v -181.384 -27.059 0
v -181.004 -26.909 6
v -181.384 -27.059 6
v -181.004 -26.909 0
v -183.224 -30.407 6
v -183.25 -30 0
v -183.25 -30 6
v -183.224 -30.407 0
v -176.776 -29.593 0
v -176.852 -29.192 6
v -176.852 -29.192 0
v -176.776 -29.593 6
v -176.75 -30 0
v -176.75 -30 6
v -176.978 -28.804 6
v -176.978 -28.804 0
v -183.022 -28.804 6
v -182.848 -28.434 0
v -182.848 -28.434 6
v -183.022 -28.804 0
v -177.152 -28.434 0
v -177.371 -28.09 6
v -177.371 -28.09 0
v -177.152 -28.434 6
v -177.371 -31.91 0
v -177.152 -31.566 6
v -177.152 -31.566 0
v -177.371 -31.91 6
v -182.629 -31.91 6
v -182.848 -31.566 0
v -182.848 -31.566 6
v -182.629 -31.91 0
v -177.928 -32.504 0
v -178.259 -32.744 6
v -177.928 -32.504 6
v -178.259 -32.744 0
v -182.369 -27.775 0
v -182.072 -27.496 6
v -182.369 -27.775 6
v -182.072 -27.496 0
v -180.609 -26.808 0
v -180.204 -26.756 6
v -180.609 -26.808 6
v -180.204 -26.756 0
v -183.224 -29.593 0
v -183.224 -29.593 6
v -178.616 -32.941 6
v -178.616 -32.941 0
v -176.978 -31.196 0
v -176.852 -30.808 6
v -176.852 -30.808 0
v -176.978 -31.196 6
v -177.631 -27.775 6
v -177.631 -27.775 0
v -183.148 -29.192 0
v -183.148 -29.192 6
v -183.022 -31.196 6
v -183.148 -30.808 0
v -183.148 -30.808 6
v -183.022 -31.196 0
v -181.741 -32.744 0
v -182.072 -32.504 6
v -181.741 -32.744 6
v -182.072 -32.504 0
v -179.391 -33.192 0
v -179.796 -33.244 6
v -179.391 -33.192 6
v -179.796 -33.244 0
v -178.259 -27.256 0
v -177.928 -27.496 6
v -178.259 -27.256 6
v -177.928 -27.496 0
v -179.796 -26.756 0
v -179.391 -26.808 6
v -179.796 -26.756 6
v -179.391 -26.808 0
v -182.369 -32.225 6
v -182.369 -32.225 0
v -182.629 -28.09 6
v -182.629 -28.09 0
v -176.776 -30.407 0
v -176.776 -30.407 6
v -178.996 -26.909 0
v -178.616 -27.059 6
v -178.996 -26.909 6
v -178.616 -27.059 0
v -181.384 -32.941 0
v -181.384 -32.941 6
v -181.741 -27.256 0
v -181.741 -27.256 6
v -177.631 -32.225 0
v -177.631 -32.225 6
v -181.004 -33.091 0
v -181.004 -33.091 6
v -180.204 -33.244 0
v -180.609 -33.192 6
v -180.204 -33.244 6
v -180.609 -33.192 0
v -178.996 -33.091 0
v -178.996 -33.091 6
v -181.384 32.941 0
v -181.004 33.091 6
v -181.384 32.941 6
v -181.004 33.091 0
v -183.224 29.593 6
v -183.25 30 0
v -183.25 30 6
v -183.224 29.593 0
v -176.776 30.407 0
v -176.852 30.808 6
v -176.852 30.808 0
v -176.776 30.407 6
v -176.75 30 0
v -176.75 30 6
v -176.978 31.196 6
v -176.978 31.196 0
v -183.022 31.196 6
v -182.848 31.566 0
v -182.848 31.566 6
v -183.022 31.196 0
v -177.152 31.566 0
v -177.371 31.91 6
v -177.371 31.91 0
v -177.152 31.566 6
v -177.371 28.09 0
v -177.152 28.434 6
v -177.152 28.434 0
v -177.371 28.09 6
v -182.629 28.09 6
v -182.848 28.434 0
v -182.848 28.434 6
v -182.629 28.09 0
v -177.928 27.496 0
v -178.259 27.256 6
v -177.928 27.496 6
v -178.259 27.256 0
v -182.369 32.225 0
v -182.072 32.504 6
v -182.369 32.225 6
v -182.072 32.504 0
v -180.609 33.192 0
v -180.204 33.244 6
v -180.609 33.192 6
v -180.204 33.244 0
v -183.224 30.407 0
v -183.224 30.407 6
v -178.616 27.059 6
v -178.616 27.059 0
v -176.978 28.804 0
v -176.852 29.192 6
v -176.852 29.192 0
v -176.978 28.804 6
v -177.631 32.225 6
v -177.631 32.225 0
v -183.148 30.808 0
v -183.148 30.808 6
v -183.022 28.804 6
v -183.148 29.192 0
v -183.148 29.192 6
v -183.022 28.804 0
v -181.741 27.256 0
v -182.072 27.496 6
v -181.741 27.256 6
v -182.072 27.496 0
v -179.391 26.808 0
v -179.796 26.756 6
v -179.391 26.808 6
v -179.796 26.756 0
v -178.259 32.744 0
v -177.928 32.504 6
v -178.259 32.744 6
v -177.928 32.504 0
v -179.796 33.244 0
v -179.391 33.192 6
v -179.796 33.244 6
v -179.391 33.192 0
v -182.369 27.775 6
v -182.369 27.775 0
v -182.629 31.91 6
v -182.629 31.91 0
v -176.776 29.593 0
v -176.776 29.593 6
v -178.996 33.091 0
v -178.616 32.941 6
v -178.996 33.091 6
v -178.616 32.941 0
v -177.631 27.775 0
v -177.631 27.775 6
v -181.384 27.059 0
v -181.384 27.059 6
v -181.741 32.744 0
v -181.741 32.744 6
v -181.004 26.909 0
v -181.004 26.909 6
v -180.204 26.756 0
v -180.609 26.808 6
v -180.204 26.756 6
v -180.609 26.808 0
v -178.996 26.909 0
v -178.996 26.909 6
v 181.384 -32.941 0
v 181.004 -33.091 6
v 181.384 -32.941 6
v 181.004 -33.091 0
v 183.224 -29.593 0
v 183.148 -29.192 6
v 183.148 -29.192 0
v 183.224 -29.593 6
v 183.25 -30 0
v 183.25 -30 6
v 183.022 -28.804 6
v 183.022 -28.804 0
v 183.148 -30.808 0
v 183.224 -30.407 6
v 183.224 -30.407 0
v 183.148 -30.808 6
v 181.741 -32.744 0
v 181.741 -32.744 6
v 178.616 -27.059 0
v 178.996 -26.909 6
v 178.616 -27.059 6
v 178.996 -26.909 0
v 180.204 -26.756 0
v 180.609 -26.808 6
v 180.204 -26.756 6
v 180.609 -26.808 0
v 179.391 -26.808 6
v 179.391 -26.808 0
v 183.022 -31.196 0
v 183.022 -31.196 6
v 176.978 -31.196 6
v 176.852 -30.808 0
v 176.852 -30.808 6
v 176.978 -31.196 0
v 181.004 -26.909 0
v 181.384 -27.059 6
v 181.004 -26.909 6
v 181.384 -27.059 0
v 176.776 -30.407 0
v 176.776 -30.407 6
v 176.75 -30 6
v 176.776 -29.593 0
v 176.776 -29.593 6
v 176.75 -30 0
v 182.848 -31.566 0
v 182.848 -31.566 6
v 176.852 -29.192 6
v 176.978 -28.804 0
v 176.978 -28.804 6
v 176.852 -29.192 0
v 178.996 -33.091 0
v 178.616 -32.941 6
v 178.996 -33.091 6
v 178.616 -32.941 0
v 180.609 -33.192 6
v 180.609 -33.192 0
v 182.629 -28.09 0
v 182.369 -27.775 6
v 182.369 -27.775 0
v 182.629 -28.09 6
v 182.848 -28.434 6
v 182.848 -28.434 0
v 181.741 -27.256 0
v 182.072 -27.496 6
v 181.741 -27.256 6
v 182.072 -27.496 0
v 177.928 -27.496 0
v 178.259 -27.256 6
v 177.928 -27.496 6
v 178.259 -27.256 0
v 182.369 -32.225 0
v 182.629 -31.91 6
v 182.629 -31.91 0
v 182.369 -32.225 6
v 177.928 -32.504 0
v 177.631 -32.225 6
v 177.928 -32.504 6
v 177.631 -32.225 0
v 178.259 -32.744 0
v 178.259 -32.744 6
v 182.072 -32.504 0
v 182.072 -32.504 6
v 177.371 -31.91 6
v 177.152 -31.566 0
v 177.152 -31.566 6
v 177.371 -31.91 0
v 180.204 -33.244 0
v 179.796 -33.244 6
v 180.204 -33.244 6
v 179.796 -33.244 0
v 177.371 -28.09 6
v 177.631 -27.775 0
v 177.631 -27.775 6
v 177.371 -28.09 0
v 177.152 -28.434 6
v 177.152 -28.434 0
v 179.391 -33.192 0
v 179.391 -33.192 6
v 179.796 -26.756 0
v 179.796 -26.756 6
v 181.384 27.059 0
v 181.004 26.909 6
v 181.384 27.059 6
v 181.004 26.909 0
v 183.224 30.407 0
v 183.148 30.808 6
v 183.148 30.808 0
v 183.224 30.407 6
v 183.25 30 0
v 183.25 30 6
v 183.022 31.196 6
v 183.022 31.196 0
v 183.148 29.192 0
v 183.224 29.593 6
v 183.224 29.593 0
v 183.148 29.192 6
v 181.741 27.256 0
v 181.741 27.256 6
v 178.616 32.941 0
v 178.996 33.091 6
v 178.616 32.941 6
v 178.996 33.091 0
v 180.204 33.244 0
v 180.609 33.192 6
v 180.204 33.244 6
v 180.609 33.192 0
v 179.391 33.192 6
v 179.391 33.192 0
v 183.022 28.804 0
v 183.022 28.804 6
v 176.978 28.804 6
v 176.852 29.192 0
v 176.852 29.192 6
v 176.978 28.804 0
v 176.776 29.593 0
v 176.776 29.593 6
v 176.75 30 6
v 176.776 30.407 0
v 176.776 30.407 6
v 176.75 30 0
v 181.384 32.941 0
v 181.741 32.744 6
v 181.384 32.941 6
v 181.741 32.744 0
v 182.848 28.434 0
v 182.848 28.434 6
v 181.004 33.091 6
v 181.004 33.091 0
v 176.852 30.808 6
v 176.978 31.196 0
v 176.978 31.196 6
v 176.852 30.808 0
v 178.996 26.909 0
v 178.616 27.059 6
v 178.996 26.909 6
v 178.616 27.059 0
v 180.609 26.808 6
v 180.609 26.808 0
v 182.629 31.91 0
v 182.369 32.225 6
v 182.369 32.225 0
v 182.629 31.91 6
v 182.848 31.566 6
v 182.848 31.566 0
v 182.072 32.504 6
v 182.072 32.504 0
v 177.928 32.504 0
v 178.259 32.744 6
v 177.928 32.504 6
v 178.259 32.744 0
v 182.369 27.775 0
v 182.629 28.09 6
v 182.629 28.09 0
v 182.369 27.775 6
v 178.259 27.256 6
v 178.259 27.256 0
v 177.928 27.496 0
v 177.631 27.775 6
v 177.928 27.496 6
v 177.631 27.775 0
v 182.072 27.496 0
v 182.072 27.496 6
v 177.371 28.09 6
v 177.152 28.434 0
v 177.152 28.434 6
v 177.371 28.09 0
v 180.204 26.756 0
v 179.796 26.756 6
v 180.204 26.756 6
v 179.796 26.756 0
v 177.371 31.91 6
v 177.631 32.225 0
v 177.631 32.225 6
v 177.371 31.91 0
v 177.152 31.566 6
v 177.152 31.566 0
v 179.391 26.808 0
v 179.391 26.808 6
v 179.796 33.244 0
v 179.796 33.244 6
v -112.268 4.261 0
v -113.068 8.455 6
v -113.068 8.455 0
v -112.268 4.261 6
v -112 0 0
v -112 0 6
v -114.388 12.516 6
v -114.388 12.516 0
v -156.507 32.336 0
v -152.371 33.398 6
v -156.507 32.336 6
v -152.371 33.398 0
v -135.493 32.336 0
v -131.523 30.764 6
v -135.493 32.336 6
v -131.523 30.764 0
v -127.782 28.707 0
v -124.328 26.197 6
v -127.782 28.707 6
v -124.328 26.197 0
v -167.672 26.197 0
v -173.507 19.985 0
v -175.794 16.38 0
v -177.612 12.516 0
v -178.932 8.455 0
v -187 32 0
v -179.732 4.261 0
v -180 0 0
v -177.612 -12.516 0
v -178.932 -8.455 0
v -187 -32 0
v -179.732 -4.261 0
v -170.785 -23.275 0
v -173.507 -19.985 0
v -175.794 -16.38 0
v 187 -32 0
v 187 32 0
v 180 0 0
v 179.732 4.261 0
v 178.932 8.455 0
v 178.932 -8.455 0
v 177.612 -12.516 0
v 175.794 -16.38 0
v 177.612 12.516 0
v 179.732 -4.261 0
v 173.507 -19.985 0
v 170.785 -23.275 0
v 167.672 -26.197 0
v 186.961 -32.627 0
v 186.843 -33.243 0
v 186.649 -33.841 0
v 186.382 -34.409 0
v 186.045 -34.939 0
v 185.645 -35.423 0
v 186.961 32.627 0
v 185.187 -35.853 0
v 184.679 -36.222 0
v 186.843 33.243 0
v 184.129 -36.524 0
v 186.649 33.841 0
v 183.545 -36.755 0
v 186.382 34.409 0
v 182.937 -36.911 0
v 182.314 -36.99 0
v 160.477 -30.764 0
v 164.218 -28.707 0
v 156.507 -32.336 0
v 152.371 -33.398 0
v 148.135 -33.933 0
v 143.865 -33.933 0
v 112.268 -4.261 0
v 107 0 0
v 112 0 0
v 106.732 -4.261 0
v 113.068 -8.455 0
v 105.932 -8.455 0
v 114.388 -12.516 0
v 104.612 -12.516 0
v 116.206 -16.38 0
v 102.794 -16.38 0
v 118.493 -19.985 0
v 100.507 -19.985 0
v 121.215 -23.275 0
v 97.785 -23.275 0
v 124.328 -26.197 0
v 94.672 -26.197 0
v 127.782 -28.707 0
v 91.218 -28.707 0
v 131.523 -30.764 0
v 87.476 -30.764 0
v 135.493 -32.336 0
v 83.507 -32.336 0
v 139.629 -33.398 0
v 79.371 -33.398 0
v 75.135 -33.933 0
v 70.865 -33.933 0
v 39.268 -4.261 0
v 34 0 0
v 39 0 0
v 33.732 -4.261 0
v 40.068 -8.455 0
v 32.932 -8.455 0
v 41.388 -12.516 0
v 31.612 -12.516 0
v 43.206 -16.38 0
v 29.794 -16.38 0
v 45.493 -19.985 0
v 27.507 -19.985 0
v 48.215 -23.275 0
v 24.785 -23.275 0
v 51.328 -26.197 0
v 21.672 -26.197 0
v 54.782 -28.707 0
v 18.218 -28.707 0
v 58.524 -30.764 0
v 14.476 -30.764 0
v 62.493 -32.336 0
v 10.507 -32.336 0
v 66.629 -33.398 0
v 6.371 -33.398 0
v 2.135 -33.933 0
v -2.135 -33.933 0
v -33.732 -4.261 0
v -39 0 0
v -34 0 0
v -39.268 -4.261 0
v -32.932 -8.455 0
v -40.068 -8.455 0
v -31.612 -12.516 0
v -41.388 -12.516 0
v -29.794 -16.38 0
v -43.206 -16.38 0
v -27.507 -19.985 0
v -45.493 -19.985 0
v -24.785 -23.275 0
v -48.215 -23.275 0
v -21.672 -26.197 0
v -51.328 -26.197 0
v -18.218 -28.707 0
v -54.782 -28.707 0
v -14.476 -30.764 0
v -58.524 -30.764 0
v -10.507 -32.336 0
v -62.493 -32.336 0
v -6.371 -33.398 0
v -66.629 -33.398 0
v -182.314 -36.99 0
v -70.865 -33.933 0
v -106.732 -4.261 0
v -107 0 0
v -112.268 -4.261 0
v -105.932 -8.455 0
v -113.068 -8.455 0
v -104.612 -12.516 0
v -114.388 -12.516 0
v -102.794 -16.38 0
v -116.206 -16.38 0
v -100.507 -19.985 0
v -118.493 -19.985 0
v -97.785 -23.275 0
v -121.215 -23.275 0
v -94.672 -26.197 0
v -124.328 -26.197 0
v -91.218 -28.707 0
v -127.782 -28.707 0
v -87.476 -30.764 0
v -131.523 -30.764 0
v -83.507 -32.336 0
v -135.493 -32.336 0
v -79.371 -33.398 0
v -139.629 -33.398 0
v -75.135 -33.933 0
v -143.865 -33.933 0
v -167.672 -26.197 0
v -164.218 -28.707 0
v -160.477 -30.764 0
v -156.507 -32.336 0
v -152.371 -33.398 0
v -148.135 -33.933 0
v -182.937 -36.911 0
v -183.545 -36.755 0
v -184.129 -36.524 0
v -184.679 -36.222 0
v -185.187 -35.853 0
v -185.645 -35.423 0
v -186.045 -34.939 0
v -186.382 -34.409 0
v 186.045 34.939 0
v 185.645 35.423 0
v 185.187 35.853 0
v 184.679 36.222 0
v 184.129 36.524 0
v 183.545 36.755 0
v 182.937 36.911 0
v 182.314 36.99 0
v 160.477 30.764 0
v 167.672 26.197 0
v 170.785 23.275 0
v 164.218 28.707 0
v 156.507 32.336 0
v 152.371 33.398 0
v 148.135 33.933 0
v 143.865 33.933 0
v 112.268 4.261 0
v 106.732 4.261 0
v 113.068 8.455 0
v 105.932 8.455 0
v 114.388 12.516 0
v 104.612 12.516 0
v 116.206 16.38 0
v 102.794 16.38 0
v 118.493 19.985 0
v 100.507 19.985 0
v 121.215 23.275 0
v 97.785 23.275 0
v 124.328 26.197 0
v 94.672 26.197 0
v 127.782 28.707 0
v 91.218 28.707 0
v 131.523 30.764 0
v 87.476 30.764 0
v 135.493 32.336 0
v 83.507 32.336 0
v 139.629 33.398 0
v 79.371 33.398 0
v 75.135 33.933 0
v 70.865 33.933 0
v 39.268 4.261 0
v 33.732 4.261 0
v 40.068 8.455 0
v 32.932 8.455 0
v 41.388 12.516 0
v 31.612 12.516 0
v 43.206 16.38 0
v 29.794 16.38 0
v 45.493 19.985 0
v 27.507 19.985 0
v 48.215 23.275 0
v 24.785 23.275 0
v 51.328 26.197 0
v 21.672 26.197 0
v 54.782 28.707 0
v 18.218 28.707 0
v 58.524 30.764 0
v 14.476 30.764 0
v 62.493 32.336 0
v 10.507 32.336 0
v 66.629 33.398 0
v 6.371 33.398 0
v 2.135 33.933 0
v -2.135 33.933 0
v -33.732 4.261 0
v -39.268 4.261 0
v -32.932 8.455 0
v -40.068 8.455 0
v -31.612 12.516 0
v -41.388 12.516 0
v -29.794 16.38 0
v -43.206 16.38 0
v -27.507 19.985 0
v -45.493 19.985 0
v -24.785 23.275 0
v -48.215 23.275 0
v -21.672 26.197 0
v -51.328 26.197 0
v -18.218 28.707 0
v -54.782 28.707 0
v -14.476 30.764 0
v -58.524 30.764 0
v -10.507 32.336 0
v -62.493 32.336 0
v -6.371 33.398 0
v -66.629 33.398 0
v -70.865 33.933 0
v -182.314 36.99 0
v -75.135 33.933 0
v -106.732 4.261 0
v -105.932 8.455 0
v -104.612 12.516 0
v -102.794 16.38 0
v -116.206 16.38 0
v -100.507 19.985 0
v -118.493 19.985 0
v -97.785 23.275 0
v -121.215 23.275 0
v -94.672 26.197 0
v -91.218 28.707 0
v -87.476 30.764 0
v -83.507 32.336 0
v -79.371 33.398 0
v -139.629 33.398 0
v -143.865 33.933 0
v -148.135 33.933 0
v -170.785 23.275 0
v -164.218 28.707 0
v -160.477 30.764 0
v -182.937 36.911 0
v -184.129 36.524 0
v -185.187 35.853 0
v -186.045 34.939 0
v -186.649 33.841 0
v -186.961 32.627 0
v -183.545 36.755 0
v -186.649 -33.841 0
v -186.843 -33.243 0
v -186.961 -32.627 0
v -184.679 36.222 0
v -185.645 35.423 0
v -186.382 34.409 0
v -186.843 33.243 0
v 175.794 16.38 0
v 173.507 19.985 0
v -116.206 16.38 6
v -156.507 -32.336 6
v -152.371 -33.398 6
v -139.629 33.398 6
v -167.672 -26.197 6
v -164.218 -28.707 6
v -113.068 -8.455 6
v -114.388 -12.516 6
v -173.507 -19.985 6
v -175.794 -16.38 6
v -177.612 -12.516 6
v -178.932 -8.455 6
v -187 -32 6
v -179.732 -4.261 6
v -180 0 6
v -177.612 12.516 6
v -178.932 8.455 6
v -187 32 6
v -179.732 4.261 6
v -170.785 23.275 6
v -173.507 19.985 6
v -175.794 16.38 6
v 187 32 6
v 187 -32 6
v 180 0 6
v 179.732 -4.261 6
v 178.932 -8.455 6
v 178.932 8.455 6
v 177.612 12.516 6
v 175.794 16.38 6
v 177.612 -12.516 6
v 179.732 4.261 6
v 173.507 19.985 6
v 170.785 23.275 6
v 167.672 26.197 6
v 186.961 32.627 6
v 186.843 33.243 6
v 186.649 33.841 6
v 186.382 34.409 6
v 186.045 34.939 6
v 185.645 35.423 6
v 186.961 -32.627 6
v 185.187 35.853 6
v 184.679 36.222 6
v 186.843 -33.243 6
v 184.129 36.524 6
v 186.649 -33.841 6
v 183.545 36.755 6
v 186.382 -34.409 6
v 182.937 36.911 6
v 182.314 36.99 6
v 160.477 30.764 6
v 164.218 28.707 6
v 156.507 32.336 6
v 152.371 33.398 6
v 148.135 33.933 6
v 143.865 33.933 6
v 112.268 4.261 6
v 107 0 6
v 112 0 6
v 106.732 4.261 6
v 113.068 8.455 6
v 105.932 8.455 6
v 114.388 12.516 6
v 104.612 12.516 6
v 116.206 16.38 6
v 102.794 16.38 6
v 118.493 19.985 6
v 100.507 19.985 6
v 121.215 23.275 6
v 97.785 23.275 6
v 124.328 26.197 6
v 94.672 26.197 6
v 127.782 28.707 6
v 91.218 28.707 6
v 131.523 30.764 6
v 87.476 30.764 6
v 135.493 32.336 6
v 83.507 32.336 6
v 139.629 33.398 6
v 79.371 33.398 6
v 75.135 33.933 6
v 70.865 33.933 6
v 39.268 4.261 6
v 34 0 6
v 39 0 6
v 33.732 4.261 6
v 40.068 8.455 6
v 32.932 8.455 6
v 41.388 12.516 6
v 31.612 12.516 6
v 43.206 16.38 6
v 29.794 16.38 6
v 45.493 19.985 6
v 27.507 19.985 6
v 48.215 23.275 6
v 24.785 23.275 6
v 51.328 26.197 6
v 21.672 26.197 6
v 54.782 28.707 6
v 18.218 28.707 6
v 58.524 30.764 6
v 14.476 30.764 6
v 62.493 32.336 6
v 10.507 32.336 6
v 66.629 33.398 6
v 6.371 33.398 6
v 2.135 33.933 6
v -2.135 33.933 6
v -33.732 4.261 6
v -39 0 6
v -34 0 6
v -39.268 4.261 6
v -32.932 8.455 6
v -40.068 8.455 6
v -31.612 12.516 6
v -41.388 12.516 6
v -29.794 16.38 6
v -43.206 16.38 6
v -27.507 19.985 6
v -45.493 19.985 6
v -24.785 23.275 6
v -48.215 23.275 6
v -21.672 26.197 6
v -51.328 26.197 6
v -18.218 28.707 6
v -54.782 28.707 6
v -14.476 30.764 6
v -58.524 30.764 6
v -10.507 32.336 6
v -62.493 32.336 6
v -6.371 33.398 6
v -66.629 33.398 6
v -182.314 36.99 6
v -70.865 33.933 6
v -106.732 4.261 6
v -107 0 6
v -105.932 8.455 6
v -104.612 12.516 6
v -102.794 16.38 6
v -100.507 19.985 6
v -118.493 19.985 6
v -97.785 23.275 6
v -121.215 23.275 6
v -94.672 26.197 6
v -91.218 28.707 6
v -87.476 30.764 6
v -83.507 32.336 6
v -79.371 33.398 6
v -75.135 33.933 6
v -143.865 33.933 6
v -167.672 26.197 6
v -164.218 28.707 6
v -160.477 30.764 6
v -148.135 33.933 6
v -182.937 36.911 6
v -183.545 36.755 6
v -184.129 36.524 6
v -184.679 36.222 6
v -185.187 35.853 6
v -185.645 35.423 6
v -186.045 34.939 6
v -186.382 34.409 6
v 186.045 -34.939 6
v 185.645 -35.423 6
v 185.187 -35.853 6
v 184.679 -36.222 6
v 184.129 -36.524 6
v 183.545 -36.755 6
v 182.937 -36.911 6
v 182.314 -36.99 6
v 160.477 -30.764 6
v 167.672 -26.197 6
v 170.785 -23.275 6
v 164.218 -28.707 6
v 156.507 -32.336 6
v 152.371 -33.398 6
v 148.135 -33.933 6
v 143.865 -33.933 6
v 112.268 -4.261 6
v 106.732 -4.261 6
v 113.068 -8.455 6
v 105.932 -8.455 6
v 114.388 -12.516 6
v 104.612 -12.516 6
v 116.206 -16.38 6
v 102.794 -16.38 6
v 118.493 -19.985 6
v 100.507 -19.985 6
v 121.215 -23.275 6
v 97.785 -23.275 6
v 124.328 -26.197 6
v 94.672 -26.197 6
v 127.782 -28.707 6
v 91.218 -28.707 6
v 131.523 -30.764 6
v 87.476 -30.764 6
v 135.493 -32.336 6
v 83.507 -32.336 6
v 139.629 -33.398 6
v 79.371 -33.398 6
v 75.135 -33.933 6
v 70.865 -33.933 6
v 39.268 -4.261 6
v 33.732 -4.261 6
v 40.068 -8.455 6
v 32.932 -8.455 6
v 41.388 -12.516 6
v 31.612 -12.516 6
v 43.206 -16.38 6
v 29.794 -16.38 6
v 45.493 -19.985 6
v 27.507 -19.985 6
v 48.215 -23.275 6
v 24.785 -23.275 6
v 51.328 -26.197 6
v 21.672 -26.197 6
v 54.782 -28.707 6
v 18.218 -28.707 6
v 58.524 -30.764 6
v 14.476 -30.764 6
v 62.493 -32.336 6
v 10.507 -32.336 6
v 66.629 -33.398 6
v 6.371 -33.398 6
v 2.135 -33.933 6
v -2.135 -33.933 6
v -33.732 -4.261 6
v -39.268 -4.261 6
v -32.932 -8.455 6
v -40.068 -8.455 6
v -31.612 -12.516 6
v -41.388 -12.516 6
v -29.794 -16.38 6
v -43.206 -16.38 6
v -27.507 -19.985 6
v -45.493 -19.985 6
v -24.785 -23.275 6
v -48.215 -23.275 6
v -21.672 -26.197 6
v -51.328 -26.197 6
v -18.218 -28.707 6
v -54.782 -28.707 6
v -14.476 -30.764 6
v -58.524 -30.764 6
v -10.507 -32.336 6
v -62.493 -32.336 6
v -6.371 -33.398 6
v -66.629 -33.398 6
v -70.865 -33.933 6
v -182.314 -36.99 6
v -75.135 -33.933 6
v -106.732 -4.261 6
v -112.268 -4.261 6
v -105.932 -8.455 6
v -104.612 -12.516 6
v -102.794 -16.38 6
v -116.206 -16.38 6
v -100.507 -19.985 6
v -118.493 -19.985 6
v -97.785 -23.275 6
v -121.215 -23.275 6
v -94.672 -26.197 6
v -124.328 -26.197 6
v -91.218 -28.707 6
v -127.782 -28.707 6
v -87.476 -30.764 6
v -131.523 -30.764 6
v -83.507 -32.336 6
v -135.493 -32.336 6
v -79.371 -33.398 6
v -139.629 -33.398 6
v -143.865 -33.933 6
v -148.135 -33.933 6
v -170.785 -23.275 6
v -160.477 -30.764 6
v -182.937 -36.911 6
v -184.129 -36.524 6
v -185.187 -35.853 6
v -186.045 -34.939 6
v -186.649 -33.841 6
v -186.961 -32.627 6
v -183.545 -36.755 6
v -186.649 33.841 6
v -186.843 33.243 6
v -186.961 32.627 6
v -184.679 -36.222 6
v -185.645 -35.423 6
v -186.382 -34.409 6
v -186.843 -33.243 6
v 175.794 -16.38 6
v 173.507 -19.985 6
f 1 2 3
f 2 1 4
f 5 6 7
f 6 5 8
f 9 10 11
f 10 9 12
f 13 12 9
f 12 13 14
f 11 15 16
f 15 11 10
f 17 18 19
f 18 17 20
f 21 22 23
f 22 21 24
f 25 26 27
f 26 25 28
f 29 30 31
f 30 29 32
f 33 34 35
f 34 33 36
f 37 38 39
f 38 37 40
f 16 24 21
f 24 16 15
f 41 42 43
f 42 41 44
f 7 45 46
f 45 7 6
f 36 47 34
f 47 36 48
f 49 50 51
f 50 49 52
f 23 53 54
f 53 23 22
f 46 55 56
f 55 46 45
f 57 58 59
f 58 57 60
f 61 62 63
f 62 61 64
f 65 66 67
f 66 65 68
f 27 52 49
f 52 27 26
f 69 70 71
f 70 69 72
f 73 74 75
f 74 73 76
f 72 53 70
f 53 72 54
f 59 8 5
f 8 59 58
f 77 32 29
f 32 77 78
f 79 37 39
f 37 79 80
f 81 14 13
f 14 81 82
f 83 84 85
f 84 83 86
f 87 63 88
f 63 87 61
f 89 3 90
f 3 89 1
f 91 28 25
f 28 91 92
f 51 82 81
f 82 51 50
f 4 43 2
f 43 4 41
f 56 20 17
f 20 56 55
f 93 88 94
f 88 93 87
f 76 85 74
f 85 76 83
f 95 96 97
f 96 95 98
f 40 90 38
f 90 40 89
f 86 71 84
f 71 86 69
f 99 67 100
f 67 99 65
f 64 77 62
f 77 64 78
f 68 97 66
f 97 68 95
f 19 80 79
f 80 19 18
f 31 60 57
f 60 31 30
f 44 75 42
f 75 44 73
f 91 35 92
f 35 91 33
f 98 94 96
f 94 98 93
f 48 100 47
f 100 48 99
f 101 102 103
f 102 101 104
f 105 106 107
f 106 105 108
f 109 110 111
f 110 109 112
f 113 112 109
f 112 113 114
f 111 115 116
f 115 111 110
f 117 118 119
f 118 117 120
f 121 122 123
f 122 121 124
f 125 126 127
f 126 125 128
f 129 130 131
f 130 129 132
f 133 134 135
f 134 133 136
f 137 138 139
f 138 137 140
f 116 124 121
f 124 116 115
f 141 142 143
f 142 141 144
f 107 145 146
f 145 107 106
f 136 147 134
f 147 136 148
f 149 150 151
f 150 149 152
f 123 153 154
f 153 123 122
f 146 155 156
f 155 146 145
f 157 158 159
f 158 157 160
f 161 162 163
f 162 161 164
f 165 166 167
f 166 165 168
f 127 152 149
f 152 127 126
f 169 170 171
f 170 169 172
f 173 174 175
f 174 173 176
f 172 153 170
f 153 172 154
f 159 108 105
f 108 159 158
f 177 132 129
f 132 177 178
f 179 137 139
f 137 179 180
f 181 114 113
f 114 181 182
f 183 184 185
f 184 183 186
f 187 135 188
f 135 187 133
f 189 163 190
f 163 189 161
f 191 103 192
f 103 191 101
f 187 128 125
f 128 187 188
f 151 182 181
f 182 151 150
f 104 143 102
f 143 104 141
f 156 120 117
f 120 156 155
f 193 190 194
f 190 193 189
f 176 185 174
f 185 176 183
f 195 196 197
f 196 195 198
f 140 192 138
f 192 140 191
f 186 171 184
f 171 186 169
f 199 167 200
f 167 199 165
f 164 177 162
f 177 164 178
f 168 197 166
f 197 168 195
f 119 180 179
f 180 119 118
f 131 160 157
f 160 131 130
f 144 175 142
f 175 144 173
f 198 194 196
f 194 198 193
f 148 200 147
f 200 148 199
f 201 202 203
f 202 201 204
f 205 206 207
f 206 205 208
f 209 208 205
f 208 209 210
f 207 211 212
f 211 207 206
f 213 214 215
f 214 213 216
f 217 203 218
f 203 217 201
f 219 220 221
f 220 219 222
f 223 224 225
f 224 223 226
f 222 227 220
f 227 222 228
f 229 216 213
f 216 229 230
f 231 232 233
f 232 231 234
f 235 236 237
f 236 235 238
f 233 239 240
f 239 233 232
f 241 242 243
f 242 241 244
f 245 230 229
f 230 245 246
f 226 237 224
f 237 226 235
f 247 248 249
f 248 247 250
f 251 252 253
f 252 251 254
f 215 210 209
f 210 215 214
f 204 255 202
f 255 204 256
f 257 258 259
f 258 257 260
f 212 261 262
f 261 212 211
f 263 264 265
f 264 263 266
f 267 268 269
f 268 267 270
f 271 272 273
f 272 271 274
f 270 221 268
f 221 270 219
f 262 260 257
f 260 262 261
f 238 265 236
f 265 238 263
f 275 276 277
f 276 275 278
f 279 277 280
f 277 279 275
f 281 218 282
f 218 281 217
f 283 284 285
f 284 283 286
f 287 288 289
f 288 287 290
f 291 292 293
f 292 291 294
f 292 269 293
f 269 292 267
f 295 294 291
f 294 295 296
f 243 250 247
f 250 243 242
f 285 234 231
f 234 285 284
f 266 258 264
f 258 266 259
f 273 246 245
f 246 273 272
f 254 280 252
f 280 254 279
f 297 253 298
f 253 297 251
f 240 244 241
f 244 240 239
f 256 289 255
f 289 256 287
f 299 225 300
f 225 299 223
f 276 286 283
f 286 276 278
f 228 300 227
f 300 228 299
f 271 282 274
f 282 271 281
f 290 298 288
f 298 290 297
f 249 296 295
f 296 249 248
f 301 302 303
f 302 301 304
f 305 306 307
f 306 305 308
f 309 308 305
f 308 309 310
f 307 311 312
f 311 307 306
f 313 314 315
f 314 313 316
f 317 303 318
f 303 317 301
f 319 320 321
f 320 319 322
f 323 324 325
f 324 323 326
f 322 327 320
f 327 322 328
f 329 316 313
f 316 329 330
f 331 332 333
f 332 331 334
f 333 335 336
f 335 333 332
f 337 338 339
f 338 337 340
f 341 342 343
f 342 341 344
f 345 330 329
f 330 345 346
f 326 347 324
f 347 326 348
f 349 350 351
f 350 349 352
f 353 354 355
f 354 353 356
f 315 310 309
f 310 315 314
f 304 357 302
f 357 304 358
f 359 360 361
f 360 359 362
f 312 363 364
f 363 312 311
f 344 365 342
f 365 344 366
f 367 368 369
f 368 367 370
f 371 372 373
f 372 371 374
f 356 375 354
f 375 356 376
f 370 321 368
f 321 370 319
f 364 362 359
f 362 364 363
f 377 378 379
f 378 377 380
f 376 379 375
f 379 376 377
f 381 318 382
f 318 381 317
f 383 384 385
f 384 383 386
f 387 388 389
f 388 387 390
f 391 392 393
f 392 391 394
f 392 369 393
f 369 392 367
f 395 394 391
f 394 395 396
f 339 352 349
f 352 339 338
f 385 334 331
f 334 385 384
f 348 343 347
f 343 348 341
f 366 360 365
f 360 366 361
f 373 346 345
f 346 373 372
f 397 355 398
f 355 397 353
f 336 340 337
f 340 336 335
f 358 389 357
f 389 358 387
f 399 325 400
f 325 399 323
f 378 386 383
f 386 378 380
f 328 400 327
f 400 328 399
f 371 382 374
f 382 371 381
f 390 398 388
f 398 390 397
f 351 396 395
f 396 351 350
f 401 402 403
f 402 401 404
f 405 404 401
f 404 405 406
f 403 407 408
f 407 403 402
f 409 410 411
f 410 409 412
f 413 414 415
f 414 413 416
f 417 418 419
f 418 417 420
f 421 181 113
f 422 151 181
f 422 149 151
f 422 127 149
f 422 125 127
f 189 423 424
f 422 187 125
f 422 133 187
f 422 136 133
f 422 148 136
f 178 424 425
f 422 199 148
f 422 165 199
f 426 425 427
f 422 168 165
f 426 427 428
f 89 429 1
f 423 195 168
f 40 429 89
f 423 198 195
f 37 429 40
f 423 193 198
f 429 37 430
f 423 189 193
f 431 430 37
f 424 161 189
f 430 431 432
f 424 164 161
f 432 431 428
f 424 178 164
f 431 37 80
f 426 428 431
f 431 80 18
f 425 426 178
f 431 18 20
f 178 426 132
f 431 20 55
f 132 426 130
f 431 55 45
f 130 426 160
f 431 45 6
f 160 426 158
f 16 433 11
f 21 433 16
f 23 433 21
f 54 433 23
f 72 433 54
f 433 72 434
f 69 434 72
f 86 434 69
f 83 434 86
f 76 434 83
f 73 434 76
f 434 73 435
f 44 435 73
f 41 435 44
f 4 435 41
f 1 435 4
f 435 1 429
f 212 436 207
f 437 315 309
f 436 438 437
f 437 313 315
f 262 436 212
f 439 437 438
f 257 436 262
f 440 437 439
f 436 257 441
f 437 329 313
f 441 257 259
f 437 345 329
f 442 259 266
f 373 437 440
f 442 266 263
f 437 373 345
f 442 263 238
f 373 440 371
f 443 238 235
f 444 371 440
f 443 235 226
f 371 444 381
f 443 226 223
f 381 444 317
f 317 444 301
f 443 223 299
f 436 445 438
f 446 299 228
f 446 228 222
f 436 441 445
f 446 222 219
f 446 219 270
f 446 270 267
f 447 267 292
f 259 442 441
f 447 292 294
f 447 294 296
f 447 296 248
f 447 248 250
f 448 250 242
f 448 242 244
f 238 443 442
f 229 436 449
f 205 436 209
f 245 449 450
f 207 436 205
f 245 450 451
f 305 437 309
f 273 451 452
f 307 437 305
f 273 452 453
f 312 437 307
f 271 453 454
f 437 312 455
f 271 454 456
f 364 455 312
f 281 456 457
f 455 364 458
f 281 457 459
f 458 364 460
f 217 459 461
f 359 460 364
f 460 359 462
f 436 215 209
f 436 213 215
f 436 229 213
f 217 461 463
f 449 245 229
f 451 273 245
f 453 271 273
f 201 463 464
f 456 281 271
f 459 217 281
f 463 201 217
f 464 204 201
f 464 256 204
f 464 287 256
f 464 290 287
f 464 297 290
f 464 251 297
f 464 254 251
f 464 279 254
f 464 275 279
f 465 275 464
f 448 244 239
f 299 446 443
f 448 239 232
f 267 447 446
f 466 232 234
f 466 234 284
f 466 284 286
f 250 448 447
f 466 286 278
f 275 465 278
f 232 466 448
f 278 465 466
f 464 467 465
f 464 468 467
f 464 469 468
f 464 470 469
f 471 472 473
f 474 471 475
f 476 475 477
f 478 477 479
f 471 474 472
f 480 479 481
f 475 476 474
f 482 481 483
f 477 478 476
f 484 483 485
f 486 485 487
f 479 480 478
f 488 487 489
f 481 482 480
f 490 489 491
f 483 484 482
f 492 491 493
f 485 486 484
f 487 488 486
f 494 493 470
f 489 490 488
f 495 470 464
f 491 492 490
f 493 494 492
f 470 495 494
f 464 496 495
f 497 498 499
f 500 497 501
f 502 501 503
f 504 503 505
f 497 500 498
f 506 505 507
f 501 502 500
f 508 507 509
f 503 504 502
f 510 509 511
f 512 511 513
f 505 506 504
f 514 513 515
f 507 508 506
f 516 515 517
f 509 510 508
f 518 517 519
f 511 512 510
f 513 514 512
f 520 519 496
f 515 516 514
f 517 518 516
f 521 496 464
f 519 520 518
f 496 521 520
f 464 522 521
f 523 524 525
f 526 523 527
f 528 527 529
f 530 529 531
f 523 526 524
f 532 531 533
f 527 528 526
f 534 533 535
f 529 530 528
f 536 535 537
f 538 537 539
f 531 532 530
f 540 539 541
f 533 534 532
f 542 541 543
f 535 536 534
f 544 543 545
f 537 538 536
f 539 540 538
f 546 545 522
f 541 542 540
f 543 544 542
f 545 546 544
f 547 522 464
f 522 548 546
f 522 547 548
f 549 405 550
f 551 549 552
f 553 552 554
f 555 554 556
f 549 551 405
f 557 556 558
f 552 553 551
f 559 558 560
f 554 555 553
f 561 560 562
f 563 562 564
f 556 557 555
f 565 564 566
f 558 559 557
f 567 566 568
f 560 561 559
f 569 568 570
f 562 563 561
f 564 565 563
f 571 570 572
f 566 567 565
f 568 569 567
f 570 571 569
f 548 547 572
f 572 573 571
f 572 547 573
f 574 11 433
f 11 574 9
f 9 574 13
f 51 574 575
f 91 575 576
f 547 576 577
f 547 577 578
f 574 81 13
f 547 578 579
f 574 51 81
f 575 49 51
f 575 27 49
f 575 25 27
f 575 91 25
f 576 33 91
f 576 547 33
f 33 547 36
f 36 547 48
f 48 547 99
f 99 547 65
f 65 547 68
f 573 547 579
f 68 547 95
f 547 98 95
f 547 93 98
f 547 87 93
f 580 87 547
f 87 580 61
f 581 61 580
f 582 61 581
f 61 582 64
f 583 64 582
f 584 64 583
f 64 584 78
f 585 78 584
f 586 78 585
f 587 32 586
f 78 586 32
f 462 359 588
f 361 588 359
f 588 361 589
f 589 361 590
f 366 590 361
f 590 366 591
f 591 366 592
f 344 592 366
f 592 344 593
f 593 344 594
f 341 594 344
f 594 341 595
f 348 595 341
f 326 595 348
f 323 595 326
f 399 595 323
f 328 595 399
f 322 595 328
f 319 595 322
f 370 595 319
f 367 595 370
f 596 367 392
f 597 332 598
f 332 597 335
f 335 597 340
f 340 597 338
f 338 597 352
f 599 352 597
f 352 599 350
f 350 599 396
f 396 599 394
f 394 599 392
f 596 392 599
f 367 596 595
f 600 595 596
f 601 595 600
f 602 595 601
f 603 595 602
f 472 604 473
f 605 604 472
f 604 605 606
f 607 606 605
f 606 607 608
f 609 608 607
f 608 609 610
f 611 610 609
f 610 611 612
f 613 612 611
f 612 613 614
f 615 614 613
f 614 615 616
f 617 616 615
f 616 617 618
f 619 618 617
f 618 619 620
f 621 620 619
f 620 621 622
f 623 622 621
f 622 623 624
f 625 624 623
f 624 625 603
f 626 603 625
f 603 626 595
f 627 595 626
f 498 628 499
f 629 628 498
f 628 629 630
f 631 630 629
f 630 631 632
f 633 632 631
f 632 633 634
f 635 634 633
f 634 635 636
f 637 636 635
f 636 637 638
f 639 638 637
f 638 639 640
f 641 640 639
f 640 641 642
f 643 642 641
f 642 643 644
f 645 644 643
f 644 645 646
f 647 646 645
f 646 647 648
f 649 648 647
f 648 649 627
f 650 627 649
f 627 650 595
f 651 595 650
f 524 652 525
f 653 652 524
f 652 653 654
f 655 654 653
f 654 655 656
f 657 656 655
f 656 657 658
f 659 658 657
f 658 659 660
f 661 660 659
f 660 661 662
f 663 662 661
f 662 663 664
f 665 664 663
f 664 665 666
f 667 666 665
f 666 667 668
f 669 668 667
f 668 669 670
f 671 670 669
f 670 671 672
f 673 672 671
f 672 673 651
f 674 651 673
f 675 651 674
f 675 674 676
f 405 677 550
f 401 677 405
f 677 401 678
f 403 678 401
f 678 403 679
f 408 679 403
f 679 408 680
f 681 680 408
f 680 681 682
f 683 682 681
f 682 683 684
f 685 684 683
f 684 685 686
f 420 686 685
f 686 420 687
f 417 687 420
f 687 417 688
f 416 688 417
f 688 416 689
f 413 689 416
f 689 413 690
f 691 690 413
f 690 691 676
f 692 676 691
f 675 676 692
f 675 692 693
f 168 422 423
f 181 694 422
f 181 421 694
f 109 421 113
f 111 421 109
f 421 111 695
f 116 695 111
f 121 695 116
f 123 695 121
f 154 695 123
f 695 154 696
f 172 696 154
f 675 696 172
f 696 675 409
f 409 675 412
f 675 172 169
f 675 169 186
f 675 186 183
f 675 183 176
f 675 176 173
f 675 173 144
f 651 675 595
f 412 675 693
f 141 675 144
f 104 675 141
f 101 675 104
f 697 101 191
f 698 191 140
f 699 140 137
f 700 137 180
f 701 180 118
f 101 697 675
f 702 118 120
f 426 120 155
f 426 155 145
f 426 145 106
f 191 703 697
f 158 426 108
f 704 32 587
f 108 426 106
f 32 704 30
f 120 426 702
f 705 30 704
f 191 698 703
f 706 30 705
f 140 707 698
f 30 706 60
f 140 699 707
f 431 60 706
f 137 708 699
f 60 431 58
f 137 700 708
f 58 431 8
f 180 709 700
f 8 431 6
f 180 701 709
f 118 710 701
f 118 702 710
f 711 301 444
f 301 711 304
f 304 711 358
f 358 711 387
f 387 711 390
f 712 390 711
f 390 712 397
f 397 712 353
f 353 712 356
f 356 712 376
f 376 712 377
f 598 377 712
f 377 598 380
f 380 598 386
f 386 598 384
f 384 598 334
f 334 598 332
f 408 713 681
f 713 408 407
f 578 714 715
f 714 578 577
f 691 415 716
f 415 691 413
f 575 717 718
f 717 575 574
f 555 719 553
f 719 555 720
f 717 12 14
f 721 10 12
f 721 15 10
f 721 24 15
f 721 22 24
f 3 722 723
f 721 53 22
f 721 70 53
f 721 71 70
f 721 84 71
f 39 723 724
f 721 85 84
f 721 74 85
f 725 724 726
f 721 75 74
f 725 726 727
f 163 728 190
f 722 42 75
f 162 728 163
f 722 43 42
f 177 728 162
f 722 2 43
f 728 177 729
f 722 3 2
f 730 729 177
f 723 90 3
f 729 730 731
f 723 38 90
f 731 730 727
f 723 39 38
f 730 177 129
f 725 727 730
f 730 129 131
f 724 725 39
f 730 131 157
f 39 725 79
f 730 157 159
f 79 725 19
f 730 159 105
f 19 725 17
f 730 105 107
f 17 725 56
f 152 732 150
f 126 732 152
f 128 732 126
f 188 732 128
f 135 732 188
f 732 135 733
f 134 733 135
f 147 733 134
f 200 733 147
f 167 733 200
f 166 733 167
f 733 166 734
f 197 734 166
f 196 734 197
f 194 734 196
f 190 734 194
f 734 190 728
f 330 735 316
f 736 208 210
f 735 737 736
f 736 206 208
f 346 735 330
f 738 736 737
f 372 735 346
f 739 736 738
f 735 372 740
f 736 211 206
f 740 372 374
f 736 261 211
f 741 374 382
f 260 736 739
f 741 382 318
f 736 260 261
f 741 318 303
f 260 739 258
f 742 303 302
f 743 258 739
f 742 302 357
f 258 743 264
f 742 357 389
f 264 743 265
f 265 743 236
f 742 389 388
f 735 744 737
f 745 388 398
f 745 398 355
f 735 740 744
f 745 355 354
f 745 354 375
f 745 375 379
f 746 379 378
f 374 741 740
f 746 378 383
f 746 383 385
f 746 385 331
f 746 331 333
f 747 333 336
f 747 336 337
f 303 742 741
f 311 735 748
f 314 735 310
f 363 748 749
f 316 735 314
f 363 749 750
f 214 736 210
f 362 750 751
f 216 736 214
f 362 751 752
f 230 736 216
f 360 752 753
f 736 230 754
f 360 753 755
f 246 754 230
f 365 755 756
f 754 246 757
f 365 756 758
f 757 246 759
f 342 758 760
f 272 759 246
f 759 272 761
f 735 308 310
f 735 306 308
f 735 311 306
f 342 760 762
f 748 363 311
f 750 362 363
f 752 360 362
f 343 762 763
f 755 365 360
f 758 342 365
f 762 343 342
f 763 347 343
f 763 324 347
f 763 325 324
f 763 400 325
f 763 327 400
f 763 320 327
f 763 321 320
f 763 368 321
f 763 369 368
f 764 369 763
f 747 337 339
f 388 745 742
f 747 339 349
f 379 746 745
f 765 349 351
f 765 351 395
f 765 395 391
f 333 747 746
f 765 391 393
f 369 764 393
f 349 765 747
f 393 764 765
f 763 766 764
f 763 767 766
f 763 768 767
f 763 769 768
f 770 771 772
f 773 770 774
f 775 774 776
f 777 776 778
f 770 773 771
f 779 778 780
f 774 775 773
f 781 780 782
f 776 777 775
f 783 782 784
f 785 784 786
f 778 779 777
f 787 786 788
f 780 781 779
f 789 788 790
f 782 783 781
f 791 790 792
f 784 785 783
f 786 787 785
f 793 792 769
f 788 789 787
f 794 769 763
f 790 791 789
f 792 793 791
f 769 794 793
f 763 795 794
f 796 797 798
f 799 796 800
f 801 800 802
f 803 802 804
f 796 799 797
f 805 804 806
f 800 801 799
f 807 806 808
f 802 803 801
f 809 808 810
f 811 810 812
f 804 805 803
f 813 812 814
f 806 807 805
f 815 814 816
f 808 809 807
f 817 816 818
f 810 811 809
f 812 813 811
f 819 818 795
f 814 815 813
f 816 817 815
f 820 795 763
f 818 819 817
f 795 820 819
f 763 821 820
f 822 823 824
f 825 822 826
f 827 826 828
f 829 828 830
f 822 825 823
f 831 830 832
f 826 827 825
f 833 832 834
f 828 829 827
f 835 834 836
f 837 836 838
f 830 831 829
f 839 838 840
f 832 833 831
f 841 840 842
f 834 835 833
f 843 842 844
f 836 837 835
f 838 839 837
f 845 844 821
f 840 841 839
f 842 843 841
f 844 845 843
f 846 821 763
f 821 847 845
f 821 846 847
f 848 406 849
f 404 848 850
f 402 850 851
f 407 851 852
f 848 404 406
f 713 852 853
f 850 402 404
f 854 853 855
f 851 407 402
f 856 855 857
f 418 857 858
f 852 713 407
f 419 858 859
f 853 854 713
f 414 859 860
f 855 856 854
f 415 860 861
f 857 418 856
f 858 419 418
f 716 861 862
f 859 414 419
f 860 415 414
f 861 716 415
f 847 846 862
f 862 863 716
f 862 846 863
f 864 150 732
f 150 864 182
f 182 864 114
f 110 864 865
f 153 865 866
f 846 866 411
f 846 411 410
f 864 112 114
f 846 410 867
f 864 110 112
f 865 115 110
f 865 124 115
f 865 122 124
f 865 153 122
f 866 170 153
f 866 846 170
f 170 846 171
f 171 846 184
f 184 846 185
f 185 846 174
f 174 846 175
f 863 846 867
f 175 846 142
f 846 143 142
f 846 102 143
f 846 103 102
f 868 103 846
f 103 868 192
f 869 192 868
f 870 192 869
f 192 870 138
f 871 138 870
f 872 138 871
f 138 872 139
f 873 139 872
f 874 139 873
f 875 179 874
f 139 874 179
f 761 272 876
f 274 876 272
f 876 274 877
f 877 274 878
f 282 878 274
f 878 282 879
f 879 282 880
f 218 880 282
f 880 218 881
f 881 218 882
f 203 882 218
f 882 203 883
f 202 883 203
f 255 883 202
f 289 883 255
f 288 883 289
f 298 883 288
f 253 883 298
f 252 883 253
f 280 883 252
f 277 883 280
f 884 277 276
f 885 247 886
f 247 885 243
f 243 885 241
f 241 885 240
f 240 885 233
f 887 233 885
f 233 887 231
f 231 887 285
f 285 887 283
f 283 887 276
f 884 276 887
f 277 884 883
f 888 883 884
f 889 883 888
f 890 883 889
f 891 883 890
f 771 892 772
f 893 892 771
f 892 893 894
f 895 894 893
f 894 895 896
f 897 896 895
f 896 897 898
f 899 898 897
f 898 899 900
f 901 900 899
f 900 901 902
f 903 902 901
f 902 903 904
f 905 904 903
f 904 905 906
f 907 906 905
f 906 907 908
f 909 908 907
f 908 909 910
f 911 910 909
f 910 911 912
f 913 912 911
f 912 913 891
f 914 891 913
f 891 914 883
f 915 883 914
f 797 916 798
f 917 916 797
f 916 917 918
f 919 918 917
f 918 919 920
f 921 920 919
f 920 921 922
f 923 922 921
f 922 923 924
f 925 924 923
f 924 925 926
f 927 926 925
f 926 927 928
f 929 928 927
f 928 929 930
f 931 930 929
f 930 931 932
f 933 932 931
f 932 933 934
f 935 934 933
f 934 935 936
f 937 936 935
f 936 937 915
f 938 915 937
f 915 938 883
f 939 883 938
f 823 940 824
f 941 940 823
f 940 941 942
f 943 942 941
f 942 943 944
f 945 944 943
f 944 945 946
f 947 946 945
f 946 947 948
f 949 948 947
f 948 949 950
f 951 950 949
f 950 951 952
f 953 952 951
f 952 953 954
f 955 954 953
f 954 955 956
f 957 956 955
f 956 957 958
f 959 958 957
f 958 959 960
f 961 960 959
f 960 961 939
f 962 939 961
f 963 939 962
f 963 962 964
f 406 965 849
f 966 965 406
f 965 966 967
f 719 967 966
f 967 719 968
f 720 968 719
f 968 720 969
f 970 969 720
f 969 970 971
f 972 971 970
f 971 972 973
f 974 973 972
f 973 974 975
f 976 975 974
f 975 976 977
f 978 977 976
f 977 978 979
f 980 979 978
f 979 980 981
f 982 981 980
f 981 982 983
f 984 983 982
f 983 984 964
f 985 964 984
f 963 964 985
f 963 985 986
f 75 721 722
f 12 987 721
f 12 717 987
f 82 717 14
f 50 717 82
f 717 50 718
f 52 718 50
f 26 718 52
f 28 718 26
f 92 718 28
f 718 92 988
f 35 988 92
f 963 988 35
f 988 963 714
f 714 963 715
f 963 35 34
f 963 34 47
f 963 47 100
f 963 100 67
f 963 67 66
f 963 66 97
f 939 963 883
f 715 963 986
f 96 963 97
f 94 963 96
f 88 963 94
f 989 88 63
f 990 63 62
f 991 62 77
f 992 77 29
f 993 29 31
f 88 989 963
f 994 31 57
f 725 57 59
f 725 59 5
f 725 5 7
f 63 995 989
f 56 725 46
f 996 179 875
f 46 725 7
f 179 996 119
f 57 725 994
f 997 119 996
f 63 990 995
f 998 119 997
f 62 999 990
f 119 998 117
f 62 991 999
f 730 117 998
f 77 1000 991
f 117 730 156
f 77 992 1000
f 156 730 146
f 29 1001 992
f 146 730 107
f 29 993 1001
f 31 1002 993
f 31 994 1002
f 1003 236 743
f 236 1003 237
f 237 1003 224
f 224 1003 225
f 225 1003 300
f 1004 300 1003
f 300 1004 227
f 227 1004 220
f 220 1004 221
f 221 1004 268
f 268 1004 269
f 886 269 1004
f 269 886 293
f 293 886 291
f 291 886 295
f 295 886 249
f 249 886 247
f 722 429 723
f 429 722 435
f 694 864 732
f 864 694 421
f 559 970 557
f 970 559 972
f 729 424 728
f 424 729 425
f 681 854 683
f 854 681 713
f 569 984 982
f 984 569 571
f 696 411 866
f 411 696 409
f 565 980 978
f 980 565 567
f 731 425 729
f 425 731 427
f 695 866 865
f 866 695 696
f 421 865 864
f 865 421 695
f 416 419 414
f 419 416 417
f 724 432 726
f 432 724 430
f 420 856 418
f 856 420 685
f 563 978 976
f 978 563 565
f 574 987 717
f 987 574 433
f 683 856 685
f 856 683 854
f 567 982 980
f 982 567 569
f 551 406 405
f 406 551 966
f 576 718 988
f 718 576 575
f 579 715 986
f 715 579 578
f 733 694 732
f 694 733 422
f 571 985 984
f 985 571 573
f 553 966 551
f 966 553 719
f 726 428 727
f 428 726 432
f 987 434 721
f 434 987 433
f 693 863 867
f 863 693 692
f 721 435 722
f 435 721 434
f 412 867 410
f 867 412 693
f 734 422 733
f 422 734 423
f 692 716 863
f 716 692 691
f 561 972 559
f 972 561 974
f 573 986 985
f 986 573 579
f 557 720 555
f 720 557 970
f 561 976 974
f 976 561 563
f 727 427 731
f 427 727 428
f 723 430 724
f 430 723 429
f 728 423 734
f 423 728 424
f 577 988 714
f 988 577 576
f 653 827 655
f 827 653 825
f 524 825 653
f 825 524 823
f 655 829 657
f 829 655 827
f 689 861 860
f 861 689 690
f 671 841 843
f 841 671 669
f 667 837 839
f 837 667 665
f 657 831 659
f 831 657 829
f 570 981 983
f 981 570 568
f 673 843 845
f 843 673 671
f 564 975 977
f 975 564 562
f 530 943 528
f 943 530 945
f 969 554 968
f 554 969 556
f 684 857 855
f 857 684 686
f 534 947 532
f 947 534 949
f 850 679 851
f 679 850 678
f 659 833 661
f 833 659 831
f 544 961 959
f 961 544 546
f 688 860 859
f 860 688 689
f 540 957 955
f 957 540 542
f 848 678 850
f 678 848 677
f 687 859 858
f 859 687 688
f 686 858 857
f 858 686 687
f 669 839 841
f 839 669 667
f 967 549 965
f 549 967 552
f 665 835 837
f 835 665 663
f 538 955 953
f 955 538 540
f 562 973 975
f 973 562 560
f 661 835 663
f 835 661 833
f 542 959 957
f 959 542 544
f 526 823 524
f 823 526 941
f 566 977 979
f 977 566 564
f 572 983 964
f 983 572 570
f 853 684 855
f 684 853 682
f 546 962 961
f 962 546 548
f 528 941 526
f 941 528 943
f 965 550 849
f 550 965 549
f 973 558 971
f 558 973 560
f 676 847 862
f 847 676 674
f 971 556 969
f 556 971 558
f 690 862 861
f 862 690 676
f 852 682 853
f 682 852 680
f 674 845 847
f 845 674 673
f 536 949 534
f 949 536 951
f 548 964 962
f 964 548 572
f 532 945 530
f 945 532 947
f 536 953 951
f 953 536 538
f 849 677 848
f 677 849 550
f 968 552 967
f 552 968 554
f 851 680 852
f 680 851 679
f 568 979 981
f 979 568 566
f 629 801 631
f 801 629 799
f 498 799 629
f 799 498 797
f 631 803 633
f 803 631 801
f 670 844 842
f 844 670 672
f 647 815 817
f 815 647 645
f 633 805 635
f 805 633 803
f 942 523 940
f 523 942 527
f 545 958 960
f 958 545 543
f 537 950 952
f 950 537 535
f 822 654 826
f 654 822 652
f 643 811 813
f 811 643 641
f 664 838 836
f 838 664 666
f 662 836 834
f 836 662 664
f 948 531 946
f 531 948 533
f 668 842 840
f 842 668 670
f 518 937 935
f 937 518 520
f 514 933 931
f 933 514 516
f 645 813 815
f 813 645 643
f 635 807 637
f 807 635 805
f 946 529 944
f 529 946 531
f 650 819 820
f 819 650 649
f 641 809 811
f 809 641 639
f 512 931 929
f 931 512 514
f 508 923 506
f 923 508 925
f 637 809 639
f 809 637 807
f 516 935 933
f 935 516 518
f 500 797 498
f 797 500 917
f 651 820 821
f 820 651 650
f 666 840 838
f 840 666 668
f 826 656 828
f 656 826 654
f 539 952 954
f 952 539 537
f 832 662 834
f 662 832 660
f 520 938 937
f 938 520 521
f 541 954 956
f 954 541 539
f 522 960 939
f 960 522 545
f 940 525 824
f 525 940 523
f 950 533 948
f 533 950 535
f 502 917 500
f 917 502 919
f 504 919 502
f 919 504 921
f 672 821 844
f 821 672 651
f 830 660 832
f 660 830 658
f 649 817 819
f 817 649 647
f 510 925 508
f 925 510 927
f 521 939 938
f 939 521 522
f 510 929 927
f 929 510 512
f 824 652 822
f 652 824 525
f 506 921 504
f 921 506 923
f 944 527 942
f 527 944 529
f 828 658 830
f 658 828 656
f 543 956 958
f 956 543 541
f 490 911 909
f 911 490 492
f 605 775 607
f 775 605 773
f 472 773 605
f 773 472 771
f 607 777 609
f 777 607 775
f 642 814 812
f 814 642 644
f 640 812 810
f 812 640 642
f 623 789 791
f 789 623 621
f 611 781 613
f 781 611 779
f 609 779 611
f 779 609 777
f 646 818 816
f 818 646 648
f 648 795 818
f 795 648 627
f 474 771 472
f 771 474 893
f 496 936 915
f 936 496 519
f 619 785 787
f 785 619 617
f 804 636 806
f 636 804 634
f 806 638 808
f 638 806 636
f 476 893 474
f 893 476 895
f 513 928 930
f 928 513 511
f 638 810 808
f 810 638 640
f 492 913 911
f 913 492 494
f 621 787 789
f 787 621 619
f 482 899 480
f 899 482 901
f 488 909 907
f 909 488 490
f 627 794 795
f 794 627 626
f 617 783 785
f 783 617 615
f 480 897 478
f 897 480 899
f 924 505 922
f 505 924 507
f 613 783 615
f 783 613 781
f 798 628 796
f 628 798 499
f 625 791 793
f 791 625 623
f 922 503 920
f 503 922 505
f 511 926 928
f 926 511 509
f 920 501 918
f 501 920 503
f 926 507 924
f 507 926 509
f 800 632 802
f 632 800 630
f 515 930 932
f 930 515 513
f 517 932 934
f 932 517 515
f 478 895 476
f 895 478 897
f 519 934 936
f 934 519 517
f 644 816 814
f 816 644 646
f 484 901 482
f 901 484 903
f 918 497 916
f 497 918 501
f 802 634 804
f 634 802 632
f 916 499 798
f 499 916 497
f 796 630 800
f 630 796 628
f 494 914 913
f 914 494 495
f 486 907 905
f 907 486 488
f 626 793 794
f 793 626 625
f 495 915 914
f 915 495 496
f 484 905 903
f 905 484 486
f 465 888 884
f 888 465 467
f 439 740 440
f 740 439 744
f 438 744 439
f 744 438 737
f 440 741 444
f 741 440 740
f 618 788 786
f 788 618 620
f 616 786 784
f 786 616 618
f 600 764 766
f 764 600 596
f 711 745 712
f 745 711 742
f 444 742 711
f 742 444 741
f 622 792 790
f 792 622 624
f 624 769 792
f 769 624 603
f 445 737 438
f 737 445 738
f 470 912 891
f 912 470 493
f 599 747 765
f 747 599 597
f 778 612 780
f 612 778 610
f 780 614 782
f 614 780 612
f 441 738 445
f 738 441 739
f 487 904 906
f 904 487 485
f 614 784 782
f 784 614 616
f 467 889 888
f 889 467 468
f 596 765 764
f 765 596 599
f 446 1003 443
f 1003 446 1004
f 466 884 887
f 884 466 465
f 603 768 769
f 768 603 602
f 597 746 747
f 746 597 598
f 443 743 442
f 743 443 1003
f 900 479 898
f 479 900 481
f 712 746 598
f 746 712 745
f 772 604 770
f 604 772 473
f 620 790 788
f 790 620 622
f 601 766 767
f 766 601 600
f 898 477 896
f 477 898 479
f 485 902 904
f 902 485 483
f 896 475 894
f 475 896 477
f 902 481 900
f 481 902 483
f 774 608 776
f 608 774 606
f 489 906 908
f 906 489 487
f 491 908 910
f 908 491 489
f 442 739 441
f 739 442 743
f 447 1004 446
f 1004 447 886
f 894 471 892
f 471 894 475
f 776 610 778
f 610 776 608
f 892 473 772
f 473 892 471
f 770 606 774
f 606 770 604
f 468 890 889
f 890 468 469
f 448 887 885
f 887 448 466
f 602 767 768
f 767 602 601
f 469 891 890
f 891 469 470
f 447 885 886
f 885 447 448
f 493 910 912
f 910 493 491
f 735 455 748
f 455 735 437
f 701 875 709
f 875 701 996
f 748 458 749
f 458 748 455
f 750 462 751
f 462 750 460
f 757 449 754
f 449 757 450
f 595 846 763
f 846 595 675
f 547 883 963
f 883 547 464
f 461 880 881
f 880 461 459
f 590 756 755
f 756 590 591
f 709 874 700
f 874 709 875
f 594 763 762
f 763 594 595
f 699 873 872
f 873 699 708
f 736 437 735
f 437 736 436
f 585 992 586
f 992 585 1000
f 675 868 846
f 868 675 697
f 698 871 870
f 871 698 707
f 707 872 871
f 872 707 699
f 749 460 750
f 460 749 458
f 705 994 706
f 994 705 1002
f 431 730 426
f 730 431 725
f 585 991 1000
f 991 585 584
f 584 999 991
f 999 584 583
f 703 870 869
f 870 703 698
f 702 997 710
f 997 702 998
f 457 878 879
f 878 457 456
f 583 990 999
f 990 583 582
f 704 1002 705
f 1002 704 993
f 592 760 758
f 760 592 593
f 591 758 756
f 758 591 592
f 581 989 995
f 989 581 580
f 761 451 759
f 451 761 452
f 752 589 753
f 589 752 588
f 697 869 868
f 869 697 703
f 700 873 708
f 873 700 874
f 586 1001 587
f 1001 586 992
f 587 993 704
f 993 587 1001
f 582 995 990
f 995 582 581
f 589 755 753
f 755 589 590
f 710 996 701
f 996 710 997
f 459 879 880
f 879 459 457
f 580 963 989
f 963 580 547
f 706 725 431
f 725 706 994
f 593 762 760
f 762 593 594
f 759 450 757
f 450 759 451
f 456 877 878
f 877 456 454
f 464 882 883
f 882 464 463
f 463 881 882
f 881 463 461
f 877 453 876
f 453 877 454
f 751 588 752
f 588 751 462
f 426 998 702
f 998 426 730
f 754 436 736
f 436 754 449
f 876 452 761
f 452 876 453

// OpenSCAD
$fn = 50;


difference() {
	union() {
		hull() {
			translate(v = [-182.0000000000, 32.0000000000, 0]) {
				cylinder(h = 6, r = 5);
			}
			translate(v = [182.0000000000, 32.0000000000, 0]) {
				cylinder(h = 6, r = 5);
			}
			translate(v = [-182.0000000000, -32.0000000000, 0]) {
				cylinder(h = 6, r = 5);
			}
			translate(v = [182.0000000000, -32.0000000000, 0]) {
				cylinder(h = 6, r = 5);
			}
		}
	}
	union() {
		#translate(v = [-180.0000000000, -30.0000000000, -100.0000000000]) {
			cylinder(h = 200, r = 3.2500000000);
		}
		#translate(v = [-180.0000000000, 30.0000000000, -100.0000000000]) {
			cylinder(h = 200, r = 3.2500000000);
		}
		#translate(v = [180.0000000000, -30.0000000000, -100.0000000000]) {
			cylinder(h = 200, r = 3.2500000000);
		}
		#translate(v = [180.0000000000, 30.0000000000, -100.0000000000]) {
			cylinder(h = 200, r = 3.2500000000);
		}
		#translate(v = [-146.0000000000, 0, 0]) {
			cylinder(h = 6, r = 34.0000000000);
		}
		#translate(v = [-73.0000000000, 0, 0]) {
			cylinder(h = 6, r = 34.0000000000);
		}
		#cylinder(h = 6, r = 34.0000000000);
		#translate(v = [73.0000000000, 0, 0]) {
			cylinder(h = 6, r = 34.0000000000);
		}
		#translate(v = [146.0000000000, 0, 0]) {
			cylinder(h = 6, r = 34.0000000000);
		}
	}
}
